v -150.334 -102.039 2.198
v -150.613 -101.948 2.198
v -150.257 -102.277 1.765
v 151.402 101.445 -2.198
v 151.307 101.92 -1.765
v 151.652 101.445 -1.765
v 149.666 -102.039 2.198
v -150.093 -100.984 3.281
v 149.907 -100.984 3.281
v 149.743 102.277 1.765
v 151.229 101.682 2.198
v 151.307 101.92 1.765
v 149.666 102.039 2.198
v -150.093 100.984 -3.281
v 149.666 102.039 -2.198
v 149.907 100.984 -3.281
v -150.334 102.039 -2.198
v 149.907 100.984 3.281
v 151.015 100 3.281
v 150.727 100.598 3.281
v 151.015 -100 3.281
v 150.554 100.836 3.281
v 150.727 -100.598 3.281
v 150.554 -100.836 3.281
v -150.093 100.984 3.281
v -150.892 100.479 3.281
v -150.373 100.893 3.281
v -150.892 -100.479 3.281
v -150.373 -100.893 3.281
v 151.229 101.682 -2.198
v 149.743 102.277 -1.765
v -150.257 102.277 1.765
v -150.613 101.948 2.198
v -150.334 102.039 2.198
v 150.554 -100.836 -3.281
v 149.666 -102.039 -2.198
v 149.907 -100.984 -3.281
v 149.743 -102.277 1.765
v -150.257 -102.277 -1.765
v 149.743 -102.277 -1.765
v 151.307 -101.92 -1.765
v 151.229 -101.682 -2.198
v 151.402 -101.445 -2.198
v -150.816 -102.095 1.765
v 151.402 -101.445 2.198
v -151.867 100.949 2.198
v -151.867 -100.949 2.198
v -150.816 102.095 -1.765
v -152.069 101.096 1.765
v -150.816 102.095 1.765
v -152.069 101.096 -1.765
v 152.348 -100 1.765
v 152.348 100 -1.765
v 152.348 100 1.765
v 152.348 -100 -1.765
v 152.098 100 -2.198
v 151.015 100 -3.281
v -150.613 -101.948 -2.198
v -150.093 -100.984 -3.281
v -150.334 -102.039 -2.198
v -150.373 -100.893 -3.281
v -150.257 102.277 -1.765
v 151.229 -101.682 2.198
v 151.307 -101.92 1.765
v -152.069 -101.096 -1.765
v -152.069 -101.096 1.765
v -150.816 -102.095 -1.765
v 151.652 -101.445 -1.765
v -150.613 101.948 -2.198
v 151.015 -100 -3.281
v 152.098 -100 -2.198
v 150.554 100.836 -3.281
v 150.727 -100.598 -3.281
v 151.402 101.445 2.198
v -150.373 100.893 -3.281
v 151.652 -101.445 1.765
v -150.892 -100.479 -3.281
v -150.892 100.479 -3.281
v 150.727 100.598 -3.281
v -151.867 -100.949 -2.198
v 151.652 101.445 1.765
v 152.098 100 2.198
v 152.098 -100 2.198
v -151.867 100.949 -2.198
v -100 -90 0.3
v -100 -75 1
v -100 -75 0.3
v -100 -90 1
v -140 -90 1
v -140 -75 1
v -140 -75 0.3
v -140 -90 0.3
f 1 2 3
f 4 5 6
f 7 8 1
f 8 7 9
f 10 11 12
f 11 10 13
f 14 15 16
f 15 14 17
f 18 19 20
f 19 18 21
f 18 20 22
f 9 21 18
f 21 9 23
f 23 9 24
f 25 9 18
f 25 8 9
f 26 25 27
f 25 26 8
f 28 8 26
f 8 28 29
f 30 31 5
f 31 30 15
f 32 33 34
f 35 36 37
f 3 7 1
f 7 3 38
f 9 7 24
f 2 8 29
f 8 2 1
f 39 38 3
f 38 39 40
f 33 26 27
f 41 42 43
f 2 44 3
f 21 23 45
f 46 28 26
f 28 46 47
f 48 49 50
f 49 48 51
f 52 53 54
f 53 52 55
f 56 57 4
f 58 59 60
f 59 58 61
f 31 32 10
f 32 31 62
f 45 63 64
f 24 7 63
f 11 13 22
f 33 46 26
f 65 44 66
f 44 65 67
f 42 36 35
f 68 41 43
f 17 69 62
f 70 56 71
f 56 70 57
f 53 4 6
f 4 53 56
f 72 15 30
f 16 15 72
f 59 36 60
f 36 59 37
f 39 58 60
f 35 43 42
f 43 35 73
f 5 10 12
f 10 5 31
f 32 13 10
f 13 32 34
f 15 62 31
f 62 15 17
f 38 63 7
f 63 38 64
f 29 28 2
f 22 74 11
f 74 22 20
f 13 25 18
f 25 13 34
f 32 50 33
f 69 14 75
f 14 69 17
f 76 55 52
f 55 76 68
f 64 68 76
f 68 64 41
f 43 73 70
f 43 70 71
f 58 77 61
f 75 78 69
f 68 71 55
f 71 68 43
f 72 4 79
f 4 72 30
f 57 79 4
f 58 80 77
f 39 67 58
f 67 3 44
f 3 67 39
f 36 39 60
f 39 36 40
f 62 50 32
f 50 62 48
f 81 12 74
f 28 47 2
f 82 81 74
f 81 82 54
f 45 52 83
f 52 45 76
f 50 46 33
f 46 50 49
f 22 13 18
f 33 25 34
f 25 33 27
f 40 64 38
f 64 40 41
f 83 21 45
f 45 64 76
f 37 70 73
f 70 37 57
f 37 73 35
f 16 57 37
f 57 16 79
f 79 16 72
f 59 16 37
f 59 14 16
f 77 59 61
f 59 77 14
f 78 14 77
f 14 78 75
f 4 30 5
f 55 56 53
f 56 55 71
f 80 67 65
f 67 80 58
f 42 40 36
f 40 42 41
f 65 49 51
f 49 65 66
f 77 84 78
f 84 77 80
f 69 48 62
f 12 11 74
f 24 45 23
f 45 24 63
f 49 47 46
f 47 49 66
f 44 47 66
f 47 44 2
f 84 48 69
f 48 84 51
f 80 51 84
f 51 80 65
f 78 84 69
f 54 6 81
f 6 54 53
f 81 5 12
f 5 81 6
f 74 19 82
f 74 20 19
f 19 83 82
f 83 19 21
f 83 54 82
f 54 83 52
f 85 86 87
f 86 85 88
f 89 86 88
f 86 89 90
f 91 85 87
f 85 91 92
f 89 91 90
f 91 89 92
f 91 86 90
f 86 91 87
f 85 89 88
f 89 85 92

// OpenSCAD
// Parameters
sheet_length = 300; //[150:600:1]
sheet_width = 200; //[100:400:1]
sheet_thickness = 2; //[1:6:0.5]
chamfer_size = 0.5; //[0.2:2:0.1]
corner_radius = 2; //[0.5:10:0.5]
texture_depth = 0.1; //[0:0.5:0.05]
label_depth = 0.2; //[0:1:0.05]
label_length = 40; //[20:120:1]
label_width = 15; //[8:60:1]
label_margin = 10; //[5:40:1]
eps_overlap = 0.5; //[0.1:2:0.1]

// Base Shapes
module sheet_plate() {
  cube([sheet_length, sheet_width, sheet_thickness], center=true);
}

module rounded_corners() {
  sphere(r=corner_radius, center=true);
}

module edge_chamfer() {
  sphere(r=chamfer_size, center=true);
}

module weave_texture() {
  translate([0, 0, sheet_thickness/2 - texture_depth/2 + eps_overlap])
    cube([sheet_length - 2*label_margin, sheet_width - 2*label_margin, texture_depth], center=true);
}

module engraved_label() {
  translate([-sheet_length/2 + label_margin + label_length/2, 
             -sheet_width/2 + label_margin + label_width/2, 
             sheet_thickness/2 - (label_depth + eps_overlap)/2])
    cube([label_length, label_width, label_depth + eps_overlap], center=true);
}

// Operations
module op_round_corners_minkowski() {
  minkowski() {
    sheet_plate();
    rounded_corners();
  }
}

module op_edge_chamfer_minkowski() {
  minkowski() {
    op_round_corners_minkowski();
    edge_chamfer();
  }
}

module op_add_weave_texture_union() {
  union() {
    op_edge_chamfer_minkowski();
    weave_texture();
  }
}

module op_engrave_label_difference() {
  difference() {
    op_add_weave_texture_union();
    engraved_label();
  }
}

// Final Output
color([0.2, 0.2, 0.2]) // Carbon-fiber look
op_engrave_label_difference();
